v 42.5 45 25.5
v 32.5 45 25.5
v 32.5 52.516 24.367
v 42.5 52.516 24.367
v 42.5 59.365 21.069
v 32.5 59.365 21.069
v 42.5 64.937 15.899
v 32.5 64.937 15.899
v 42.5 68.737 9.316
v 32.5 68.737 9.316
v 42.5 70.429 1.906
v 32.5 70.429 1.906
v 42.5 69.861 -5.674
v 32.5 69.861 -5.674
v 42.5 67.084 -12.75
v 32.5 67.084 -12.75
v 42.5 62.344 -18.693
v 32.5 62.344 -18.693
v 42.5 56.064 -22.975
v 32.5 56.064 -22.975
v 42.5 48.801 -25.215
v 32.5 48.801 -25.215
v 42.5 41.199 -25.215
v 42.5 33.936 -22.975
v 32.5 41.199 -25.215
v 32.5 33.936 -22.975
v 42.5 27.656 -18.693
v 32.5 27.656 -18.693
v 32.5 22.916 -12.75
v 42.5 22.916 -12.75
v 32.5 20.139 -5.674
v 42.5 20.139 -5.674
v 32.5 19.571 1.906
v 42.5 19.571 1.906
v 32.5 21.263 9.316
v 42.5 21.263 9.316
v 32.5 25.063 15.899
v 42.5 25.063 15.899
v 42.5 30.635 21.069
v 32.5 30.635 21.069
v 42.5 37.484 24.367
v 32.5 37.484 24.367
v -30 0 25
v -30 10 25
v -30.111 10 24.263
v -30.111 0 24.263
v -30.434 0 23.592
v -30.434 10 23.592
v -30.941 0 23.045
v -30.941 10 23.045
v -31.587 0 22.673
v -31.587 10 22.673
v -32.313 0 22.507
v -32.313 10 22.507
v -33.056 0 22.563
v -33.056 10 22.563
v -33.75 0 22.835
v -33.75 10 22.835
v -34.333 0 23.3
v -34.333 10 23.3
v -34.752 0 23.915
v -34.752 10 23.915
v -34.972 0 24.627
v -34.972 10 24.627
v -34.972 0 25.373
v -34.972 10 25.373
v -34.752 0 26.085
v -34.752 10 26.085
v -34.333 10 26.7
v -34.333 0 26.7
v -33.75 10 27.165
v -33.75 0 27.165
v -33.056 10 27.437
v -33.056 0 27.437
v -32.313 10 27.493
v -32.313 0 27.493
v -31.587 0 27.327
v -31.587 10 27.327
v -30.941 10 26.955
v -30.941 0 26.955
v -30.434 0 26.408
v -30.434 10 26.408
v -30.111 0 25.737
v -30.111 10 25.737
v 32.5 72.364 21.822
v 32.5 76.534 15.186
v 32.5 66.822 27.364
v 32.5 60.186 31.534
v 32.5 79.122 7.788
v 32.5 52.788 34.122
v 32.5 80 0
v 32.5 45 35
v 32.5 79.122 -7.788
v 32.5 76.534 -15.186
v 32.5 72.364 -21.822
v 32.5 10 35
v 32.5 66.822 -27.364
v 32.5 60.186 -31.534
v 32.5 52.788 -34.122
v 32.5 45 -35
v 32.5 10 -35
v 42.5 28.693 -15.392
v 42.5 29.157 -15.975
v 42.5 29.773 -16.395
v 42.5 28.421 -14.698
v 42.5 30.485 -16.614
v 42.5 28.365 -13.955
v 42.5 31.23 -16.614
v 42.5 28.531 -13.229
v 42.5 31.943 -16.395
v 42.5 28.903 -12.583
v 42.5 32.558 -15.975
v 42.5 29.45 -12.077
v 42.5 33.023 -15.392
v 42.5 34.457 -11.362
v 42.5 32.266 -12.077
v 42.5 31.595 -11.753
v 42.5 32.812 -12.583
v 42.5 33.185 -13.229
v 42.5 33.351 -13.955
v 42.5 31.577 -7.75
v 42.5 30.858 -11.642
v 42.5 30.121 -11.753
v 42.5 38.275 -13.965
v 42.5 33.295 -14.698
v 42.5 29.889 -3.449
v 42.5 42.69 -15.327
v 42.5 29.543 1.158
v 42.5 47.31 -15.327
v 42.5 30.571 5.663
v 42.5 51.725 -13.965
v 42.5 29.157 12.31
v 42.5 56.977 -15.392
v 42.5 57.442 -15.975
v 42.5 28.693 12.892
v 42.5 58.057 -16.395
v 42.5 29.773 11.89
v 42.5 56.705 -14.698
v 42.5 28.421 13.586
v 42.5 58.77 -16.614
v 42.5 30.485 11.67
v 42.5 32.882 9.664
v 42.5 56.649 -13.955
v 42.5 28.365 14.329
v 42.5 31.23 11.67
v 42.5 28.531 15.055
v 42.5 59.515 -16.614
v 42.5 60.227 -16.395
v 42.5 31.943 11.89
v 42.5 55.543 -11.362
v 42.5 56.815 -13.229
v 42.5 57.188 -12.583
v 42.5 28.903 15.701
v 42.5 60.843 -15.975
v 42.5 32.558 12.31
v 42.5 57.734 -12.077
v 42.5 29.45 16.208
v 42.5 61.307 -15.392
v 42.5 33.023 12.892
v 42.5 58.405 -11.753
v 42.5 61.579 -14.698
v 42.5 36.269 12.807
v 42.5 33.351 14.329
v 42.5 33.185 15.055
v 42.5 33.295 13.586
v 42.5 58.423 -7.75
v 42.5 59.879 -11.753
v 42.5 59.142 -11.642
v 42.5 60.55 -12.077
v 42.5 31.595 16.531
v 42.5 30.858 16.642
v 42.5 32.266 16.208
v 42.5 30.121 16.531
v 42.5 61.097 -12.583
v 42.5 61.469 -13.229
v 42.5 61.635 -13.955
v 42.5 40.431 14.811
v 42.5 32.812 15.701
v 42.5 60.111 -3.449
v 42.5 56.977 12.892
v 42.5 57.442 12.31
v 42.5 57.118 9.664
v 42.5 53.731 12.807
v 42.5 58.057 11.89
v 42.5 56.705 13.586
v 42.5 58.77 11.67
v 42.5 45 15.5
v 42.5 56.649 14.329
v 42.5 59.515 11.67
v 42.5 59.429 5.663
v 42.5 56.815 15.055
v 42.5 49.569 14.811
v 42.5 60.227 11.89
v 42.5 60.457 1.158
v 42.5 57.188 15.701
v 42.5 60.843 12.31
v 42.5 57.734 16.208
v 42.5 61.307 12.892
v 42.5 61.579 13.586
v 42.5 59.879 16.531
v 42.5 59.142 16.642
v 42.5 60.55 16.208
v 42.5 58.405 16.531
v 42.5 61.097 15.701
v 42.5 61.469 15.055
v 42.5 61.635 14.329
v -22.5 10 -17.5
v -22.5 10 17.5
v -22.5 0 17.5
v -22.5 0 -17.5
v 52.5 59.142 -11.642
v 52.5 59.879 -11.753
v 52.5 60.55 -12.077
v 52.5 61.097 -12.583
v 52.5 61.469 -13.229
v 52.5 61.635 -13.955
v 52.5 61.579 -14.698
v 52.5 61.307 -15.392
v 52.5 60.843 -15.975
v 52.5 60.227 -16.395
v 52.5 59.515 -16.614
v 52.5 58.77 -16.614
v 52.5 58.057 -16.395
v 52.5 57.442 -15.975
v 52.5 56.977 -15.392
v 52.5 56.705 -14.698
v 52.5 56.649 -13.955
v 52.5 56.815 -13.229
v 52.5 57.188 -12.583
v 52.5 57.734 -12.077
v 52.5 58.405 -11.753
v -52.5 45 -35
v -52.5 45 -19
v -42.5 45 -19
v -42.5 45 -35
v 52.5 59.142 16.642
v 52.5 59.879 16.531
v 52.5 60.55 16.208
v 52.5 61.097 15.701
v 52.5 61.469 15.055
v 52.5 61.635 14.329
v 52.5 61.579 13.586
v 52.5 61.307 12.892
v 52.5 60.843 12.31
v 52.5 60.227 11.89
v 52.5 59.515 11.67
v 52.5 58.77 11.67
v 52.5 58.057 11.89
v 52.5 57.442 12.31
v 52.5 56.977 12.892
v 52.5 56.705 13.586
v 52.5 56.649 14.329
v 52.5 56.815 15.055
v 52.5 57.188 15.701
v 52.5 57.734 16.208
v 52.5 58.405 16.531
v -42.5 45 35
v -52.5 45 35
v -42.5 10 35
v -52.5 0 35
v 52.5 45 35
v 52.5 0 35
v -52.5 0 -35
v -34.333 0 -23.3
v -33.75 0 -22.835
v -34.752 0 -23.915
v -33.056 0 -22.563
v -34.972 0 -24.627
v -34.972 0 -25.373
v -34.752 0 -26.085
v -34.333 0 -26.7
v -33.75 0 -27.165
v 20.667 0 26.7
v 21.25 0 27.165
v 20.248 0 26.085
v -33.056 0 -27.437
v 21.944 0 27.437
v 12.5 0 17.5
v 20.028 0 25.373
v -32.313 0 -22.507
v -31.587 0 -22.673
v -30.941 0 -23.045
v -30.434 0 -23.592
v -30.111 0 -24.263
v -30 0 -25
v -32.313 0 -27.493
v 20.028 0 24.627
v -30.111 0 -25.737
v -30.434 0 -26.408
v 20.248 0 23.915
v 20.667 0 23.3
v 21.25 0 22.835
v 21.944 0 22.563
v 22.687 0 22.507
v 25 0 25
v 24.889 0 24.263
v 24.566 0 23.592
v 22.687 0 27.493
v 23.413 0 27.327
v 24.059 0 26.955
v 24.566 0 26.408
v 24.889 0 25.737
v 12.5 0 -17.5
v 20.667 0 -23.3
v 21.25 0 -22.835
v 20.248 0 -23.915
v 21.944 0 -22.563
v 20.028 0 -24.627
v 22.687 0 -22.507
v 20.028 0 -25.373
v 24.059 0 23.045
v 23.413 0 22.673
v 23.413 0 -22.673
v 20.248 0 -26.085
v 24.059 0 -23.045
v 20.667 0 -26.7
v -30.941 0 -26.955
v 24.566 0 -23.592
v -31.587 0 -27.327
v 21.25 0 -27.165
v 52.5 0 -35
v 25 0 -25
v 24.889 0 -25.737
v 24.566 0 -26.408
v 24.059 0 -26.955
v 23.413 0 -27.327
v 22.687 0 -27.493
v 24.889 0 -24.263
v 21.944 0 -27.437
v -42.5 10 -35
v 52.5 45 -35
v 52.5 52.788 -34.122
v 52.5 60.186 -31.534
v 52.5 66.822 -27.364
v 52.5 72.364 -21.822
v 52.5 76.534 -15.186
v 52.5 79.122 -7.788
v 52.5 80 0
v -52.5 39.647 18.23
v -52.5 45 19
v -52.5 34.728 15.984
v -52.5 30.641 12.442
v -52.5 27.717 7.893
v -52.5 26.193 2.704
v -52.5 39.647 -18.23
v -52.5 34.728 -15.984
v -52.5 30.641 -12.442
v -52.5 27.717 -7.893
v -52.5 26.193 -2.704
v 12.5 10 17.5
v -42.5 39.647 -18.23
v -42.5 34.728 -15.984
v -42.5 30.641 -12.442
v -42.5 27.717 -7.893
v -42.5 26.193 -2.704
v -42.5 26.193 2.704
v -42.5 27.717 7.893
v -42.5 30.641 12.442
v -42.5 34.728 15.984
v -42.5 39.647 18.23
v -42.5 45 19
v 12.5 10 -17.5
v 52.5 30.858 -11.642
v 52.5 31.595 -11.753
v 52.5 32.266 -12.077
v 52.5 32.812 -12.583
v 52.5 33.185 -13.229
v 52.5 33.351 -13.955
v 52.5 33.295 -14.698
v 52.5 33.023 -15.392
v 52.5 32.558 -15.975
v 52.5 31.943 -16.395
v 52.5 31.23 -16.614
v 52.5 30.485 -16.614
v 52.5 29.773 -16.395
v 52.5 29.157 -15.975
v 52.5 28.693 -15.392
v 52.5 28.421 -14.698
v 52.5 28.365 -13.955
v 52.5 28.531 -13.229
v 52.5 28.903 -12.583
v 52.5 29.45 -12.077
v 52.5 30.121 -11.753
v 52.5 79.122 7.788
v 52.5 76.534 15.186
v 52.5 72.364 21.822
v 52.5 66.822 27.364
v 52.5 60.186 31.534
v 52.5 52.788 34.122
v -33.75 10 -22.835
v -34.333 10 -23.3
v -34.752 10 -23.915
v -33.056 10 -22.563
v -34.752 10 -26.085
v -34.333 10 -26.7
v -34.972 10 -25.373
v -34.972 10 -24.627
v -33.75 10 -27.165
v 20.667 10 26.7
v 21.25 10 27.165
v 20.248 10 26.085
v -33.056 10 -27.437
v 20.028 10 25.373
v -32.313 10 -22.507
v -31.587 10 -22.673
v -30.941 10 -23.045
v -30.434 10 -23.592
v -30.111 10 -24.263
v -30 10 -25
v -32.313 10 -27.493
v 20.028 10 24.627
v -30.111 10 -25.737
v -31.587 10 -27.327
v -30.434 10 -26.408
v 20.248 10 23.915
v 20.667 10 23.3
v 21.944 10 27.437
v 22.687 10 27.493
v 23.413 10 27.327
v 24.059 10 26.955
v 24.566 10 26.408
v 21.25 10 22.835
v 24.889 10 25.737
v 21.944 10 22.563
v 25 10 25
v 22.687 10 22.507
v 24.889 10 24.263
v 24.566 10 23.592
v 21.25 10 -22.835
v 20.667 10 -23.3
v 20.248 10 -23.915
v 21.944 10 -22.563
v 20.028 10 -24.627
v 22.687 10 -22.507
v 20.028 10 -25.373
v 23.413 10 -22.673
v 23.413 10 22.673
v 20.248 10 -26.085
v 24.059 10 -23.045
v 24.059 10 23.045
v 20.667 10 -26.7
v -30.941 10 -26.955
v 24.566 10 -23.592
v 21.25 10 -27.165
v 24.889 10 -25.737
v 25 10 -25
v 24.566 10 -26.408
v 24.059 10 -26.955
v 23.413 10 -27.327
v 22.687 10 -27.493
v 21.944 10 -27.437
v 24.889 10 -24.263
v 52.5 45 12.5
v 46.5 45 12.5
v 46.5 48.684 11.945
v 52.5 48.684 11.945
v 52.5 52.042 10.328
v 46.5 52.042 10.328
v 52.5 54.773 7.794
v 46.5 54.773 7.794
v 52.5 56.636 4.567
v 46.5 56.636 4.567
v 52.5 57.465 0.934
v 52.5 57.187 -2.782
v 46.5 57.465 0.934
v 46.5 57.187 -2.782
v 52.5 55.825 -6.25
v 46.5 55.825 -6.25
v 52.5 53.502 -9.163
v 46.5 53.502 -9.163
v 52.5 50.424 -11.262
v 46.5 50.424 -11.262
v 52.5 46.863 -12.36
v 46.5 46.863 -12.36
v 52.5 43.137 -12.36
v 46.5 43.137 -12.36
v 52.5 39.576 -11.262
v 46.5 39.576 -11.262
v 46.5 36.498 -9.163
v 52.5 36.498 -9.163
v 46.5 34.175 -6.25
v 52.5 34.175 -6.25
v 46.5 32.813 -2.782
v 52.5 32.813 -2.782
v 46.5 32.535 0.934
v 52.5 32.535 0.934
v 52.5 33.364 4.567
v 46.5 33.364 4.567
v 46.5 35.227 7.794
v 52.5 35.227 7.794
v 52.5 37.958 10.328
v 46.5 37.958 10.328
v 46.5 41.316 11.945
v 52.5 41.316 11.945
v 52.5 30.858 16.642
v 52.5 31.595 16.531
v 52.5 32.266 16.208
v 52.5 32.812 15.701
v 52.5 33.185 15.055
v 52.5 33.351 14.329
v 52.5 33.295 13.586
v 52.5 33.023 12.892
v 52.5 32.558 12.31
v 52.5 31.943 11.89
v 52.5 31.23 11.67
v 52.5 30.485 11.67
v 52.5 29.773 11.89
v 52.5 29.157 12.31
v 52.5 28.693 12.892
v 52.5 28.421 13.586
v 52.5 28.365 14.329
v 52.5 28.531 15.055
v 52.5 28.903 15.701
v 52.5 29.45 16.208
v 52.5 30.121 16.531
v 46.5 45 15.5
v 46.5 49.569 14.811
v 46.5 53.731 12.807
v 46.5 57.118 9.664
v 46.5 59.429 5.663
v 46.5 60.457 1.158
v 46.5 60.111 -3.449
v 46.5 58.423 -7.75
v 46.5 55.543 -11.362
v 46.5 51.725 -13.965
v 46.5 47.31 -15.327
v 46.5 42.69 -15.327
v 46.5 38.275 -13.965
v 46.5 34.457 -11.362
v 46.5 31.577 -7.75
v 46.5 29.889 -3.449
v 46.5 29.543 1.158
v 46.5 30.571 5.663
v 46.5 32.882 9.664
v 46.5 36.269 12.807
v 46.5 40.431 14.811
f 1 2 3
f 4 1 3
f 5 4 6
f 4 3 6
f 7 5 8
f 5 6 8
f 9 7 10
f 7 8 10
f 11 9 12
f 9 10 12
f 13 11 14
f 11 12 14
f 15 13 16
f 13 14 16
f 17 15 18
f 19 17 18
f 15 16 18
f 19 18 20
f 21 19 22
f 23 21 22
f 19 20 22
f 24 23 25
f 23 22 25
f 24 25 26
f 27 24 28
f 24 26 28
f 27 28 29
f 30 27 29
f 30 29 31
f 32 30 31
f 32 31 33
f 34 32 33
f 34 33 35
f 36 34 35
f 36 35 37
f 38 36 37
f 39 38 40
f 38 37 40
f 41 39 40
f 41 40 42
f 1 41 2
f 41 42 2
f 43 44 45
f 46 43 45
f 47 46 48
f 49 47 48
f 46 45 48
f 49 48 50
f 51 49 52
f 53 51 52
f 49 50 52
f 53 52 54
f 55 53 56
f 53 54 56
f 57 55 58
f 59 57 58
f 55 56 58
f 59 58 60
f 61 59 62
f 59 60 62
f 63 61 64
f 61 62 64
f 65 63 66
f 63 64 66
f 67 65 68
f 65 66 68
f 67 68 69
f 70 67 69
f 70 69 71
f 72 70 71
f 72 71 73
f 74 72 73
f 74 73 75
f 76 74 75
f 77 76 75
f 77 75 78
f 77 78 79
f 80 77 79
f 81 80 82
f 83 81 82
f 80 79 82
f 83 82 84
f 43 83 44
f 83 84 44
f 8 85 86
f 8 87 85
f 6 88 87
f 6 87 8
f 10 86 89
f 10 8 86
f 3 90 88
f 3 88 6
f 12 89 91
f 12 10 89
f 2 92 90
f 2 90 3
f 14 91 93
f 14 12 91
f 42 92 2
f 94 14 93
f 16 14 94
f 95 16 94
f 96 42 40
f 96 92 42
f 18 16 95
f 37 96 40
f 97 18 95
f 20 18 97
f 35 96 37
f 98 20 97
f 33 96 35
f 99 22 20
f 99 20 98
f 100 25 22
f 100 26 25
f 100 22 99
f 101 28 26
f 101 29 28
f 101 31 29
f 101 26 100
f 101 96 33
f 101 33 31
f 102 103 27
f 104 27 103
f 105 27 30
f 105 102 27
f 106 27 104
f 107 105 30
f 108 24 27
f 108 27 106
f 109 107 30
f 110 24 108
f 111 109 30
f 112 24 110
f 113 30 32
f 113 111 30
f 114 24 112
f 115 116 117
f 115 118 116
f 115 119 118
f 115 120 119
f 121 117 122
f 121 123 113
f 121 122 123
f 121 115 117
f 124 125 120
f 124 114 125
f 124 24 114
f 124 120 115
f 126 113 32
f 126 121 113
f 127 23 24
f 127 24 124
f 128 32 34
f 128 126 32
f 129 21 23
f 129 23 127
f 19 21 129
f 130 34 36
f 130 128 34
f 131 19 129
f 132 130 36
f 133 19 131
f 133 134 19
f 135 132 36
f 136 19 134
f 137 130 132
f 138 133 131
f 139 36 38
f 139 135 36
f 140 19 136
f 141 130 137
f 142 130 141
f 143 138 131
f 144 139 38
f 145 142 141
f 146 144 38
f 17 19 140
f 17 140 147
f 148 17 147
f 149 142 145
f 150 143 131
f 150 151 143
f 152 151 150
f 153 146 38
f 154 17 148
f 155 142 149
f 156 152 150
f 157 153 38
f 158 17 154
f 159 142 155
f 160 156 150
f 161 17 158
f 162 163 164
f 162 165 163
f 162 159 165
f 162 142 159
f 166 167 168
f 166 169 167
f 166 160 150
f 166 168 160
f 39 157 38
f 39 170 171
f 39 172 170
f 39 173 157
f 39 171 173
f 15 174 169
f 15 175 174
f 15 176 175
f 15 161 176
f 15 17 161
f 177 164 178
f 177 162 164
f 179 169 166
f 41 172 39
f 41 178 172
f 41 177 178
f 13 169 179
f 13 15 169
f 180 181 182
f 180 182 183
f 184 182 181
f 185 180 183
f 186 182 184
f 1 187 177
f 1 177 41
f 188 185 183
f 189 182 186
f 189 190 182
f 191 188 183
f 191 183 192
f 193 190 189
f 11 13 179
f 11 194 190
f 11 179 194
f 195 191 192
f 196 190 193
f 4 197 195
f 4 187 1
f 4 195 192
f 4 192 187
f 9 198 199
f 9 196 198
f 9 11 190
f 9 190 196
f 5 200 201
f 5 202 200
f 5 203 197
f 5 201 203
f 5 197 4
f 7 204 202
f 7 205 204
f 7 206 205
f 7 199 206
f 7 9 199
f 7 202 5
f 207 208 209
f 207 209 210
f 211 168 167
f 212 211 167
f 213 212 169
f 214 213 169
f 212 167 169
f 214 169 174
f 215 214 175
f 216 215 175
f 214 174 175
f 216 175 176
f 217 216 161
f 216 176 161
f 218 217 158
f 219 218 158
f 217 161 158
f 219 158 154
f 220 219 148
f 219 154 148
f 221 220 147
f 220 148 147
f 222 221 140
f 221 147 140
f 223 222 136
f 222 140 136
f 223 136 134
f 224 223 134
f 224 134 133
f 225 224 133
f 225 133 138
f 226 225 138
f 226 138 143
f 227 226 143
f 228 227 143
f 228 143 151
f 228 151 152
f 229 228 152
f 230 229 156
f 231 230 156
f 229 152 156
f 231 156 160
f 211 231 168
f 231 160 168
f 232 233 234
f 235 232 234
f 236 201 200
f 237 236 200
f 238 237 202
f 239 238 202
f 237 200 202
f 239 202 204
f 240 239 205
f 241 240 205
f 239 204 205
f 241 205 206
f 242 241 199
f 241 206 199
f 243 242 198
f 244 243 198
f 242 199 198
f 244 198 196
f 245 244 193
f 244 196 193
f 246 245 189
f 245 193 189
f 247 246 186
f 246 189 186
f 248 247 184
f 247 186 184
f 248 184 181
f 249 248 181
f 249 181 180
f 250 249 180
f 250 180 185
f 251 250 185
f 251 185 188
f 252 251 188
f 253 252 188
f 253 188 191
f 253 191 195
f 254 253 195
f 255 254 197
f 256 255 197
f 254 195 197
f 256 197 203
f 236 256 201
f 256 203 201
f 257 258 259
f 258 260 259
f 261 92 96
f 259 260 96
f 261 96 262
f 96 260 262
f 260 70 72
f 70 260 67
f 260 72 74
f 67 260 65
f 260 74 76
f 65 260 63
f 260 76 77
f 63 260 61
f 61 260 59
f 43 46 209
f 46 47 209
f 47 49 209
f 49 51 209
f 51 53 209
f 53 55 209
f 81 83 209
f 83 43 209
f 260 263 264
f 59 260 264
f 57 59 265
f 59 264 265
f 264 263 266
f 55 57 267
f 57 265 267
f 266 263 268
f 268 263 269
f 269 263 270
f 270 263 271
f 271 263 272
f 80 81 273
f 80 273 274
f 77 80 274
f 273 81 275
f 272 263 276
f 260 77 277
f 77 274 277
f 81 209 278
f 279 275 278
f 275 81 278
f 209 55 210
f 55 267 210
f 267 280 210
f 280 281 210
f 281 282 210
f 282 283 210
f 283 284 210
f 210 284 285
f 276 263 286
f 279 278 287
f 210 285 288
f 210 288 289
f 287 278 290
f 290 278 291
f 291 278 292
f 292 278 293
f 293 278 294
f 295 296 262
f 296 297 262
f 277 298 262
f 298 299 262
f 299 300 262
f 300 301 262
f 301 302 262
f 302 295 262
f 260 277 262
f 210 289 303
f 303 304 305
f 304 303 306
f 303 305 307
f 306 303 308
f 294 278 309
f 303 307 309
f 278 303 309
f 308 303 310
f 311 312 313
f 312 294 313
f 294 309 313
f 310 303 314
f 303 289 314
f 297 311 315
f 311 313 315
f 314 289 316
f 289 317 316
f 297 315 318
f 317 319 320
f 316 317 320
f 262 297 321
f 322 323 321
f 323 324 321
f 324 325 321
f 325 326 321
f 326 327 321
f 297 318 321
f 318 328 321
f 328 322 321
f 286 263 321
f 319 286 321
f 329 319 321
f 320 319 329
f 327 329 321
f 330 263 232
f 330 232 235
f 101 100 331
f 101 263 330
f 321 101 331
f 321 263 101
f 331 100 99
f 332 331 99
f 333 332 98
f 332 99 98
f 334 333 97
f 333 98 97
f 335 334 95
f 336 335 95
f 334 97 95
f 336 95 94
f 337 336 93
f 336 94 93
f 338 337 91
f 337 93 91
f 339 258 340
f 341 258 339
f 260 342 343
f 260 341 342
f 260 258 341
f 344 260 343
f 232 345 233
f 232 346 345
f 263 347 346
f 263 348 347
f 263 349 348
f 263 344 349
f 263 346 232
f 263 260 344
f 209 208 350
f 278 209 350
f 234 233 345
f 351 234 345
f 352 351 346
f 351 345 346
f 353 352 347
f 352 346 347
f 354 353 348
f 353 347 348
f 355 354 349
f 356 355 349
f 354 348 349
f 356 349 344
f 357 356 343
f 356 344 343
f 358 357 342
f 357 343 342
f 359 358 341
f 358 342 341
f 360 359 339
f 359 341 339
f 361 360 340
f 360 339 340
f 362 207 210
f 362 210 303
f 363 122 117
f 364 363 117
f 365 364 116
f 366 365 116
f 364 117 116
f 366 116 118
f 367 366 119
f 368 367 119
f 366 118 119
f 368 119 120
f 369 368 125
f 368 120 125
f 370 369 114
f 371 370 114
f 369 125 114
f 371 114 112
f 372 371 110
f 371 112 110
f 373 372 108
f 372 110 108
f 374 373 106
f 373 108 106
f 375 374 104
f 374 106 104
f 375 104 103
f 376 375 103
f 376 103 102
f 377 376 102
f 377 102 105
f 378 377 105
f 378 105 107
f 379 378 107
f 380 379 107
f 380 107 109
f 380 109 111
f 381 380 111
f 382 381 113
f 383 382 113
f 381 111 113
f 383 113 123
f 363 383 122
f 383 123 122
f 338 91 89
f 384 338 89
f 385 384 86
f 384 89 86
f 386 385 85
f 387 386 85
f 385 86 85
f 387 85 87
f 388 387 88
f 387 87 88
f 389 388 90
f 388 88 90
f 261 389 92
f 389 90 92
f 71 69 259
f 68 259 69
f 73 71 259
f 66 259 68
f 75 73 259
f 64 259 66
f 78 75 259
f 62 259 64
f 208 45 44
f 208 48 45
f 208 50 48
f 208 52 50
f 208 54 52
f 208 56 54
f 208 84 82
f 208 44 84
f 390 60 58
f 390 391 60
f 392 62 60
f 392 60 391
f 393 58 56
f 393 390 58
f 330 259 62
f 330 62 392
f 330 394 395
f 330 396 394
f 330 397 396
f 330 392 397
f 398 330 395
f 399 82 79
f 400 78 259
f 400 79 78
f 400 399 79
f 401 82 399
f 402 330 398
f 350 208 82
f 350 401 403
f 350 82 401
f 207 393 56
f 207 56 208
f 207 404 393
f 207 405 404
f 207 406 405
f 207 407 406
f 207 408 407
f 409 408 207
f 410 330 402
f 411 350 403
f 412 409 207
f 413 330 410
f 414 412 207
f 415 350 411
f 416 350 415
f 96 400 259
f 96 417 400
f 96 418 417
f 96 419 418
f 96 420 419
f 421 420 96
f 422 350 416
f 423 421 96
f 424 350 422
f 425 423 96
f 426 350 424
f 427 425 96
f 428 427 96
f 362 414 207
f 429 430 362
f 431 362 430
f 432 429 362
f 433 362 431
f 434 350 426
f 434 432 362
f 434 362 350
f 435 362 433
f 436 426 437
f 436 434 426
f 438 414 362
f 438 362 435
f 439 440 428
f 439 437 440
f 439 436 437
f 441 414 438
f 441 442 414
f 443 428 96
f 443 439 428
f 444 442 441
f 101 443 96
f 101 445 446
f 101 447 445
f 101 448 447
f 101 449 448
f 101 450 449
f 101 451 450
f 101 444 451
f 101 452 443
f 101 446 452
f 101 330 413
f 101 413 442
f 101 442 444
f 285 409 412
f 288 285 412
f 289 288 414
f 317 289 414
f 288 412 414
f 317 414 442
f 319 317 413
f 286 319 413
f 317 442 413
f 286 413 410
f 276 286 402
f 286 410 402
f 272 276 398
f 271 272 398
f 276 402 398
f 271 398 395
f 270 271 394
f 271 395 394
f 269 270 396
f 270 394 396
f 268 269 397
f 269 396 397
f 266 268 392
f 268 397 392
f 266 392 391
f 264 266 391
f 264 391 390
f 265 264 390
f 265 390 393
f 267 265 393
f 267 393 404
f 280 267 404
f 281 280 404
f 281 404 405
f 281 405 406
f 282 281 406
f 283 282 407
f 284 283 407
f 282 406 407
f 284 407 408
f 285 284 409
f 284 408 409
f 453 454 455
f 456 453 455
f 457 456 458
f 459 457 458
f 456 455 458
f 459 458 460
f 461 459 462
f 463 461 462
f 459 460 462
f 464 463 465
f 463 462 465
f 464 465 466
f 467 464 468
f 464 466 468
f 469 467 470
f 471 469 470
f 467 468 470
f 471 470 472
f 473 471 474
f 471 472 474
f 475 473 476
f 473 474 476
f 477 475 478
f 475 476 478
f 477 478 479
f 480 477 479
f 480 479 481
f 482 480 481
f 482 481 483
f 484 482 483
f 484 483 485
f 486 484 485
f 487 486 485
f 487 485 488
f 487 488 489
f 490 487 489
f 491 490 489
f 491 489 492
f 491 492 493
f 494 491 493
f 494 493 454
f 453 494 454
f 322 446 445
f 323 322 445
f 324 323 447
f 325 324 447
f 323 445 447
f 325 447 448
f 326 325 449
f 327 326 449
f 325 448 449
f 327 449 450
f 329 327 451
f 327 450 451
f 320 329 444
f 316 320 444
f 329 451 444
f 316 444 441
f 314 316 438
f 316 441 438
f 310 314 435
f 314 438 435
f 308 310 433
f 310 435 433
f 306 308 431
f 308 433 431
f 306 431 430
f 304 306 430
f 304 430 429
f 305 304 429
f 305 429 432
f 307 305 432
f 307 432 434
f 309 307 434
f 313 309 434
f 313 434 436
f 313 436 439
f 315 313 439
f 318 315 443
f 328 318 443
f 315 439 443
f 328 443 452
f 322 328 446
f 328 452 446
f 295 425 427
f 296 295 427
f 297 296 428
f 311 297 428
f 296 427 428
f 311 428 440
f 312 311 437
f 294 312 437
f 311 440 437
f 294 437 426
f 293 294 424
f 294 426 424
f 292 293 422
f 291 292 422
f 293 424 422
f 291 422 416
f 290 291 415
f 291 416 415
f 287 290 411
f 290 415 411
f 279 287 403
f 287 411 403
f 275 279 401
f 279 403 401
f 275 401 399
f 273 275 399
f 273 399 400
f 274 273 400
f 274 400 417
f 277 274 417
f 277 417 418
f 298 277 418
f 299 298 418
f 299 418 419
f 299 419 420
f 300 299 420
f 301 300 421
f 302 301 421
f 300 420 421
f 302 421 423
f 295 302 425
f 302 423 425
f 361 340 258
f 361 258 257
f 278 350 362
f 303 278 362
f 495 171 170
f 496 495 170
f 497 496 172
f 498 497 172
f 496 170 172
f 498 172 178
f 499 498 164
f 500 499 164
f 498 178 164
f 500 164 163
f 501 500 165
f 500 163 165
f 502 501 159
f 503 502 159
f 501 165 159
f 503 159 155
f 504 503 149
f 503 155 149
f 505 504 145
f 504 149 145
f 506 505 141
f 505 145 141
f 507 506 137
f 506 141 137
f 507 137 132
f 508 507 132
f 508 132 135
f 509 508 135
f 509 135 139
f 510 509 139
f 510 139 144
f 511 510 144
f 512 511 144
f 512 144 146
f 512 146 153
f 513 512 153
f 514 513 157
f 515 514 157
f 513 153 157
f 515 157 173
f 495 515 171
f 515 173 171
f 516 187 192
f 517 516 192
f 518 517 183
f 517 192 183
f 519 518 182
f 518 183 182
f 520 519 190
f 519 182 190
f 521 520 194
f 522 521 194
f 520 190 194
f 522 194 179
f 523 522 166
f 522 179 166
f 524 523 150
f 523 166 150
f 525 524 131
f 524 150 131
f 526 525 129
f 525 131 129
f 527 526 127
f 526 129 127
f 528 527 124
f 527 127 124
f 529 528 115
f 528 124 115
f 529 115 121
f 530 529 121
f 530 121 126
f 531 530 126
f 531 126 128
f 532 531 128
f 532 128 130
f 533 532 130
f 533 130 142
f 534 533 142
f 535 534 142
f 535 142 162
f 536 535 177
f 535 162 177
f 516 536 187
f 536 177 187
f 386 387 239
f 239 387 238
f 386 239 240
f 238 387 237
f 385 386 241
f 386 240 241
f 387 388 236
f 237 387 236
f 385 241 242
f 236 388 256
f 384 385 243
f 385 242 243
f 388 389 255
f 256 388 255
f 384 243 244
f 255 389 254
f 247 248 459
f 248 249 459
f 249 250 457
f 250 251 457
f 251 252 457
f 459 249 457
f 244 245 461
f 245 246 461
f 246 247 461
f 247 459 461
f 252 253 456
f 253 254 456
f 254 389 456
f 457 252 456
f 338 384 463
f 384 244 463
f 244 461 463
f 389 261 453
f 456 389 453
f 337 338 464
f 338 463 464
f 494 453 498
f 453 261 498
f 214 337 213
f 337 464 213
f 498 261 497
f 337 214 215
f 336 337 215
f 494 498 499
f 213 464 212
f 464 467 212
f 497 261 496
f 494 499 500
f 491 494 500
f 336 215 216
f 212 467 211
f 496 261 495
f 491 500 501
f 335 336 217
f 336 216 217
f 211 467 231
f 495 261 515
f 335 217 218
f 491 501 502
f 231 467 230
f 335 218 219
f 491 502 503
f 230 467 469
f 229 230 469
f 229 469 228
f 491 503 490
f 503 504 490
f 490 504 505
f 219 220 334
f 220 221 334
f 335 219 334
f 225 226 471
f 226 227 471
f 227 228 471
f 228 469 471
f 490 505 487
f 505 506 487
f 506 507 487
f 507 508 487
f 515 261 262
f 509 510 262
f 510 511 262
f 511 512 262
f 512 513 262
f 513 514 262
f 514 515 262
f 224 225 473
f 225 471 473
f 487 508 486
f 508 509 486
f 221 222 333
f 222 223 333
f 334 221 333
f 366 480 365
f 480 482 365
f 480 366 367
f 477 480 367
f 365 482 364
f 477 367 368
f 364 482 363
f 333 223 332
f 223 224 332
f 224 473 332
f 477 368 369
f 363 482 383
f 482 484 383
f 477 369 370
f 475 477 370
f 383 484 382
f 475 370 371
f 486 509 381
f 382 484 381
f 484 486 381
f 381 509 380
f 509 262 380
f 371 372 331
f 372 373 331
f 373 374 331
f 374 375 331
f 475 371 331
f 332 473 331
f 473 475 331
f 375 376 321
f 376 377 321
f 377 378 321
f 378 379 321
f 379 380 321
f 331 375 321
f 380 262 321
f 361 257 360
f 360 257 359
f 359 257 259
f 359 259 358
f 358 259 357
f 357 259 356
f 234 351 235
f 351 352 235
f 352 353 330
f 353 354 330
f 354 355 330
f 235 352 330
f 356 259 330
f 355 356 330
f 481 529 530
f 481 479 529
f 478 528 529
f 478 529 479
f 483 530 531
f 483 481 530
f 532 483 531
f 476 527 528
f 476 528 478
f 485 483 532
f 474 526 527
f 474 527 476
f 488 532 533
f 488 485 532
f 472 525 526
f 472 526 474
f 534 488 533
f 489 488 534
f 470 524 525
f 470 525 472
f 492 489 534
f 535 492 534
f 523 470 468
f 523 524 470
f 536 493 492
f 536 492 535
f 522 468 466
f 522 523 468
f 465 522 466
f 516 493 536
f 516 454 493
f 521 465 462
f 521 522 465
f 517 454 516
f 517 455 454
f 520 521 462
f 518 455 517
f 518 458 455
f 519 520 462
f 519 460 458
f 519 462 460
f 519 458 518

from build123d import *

# Parameters (mm, degrees)
SKETCH1_W           = 105
SKETCH1_H           = 70
BOSS_EXTRUDE1_DEPTH = 10
SKETCH2_W           = 20
SKETCH2_H           = 70
BOSS_EXTRUDE2_DEPTH = 70
CUT_EXTRUDE1_DEPTH  = 20
SKETCH4_R           = 25.5
CUT_EXTRUDE2_DEPTH  = 10
SKETCH5_R           = 15.5
CUT_EXTRUDE3_DEPTH  = 4
SKETCH7_R           = 2.5
CUT_EXTRUDE5_DEPTH  = 10
SKETCH9_W           = 10
SKETCH9_H           = 70
BOSS_EXTRUDE4_DEPTH = 35
SKETCH10_R          = 19
CUT_EXTRUDE7_DEPTH  = 10
SKETCH11_R          = 2.5
CUT_EXTRUDE9_DEPTH  = 10
SKETCH6_R           = 12.5
CUT_EXTRUDE10_DEPTH = 10
SKETCH13_W          = 35
SKETCH13_H          = 35
CUT_EXTRUDE11_DEPTH = 10


with BuildPart() as part:
    # Sketch1 → Boss-Extrude1 (new body)
    with BuildSketch(Plane(origin=(0, 0, 0), x_dir=(1, 0, 0), z_dir=(0, 1, 0))):
        Rectangle(SKETCH1_W, SKETCH1_H)
    extrude(amount=BOSS_EXTRUDE1_DEPTH)

    # Sketch2 → Boss-Extrude2 (add)
    with BuildSketch(Plane(origin=(0, 10, 0), x_dir=(1, 0, 0), z_dir=(0, 1, 0))):
        with Locations((42.5, 0)):
            Rectangle(SKETCH2_W, SKETCH2_H)
    extrude(amount=BOSS_EXTRUDE2_DEPTH)

    # Sketch3 → Cut-Extrude1 (cut)
    with BuildSketch(Plane.ZY.offset(-32.5)):
        with BuildLine():
            Line((3e-08, 80), (-35, 80))
            Line((-35, 80), (-35, 45))
            ThreePointArc((-35, 45), (-24.748737331, 69.748737352), (3e-08, 80))
        make_face()
        with BuildLine():
            Line((35, 80), (3e-08, 80))
            ThreePointArc((3e-08, 80), (24.748737352, 69.748737331), (35, 45))
            Line((35, 45), (35, 80))
        make_face()
    extrude(amount=-CUT_EXTRUDE1_DEPTH, mode=Mode.SUBTRACT)

    # Sketch4 → Cut-Extrude2 (cut)
    with BuildSketch(Plane.ZY.offset(-32.5)):
        with Locations((0, 45)):
            Circle(SKETCH4_R)
    extrude(amount=-CUT_EXTRUDE2_DEPTH, mode=Mode.SUBTRACT)

    # Sketch5 → Cut-Extrude3 (cut)
    with BuildSketch(Plane.ZY.offset(-42.5)):
        with Locations((0, 45)):
            Circle(SKETCH5_R)
    extrude(amount=-CUT_EXTRUDE3_DEPTH, mode=Mode.SUBTRACT)

    # Sketch7 → Cut-Extrude5 (cut)
    with BuildSketch(Plane.ZY.offset(-42.5)):
        with Locations((14.142135624, 59.142135624)):
            Circle(SKETCH7_R)
        with Locations((14.142135624, 30.857864376)):
            Circle(SKETCH7_R)
        with Locations((-14.142135624, 30.857864376)):
            Circle(SKETCH7_R)
        with Locations((-14.142135624, 59.142135624)):
            Circle(SKETCH7_R)
    extrude(amount=-CUT_EXTRUDE5_DEPTH, mode=Mode.SUBTRACT)

    # Sketch9 → Boss-Extrude4 (add)
    with BuildSketch(Plane(origin=(0, 10, 0), x_dir=(1, 0, 0), z_dir=(0, 1, 0))):
        with Locations((-47.5, 0)):
            Rectangle(SKETCH9_W, SKETCH9_H)
    extrude(amount=BOSS_EXTRUDE4_DEPTH)

    # Sketch10 → Cut-Extrude7 (cut)
    with BuildSketch(Plane.ZY.offset(52.5)):
        with Locations((0, 45)):
            Circle(SKETCH10_R)
    extrude(amount=-CUT_EXTRUDE7_DEPTH, mode=Mode.SUBTRACT)

    # Sketch11 → Cut-Extrude9 (cut)
    with BuildSketch(Plane(origin=(0, 10, 0), x_dir=(1, 0, 0), z_dir=(0, 1, 0))):
        with Locations((-32.5, 25)):
            Circle(SKETCH11_R)
        with Locations((22.5, 25)):
            Circle(SKETCH11_R)
        with Locations((22.5, -25)):
            Circle(SKETCH11_R)
        with Locations((-32.5, -25)):
            Circle(SKETCH11_R)
    extrude(amount=-CUT_EXTRUDE9_DEPTH, mode=Mode.SUBTRACT)

    # Sketch6 → Cut-Extrude10 (cut)
    with BuildSketch(Plane.ZY.offset(-46.5)):
        with Locations((0, 45)):
            Circle(SKETCH6_R)
    extrude(amount=-CUT_EXTRUDE10_DEPTH, mode=Mode.SUBTRACT)

    # Sketch13 → Cut-Extrude11 (cut)
    with BuildSketch(Plane(origin=(0, 10, 0), x_dir=(1, 0, 0), z_dir=(0, 1, 0))):
        with Locations((-5, 0)):
            Rectangle(SKETCH13_W, SKETCH13_H)
    extrude(amount=-CUT_EXTRUDE11_DEPTH, mode=Mode.SUBTRACT)


solid = part.part
